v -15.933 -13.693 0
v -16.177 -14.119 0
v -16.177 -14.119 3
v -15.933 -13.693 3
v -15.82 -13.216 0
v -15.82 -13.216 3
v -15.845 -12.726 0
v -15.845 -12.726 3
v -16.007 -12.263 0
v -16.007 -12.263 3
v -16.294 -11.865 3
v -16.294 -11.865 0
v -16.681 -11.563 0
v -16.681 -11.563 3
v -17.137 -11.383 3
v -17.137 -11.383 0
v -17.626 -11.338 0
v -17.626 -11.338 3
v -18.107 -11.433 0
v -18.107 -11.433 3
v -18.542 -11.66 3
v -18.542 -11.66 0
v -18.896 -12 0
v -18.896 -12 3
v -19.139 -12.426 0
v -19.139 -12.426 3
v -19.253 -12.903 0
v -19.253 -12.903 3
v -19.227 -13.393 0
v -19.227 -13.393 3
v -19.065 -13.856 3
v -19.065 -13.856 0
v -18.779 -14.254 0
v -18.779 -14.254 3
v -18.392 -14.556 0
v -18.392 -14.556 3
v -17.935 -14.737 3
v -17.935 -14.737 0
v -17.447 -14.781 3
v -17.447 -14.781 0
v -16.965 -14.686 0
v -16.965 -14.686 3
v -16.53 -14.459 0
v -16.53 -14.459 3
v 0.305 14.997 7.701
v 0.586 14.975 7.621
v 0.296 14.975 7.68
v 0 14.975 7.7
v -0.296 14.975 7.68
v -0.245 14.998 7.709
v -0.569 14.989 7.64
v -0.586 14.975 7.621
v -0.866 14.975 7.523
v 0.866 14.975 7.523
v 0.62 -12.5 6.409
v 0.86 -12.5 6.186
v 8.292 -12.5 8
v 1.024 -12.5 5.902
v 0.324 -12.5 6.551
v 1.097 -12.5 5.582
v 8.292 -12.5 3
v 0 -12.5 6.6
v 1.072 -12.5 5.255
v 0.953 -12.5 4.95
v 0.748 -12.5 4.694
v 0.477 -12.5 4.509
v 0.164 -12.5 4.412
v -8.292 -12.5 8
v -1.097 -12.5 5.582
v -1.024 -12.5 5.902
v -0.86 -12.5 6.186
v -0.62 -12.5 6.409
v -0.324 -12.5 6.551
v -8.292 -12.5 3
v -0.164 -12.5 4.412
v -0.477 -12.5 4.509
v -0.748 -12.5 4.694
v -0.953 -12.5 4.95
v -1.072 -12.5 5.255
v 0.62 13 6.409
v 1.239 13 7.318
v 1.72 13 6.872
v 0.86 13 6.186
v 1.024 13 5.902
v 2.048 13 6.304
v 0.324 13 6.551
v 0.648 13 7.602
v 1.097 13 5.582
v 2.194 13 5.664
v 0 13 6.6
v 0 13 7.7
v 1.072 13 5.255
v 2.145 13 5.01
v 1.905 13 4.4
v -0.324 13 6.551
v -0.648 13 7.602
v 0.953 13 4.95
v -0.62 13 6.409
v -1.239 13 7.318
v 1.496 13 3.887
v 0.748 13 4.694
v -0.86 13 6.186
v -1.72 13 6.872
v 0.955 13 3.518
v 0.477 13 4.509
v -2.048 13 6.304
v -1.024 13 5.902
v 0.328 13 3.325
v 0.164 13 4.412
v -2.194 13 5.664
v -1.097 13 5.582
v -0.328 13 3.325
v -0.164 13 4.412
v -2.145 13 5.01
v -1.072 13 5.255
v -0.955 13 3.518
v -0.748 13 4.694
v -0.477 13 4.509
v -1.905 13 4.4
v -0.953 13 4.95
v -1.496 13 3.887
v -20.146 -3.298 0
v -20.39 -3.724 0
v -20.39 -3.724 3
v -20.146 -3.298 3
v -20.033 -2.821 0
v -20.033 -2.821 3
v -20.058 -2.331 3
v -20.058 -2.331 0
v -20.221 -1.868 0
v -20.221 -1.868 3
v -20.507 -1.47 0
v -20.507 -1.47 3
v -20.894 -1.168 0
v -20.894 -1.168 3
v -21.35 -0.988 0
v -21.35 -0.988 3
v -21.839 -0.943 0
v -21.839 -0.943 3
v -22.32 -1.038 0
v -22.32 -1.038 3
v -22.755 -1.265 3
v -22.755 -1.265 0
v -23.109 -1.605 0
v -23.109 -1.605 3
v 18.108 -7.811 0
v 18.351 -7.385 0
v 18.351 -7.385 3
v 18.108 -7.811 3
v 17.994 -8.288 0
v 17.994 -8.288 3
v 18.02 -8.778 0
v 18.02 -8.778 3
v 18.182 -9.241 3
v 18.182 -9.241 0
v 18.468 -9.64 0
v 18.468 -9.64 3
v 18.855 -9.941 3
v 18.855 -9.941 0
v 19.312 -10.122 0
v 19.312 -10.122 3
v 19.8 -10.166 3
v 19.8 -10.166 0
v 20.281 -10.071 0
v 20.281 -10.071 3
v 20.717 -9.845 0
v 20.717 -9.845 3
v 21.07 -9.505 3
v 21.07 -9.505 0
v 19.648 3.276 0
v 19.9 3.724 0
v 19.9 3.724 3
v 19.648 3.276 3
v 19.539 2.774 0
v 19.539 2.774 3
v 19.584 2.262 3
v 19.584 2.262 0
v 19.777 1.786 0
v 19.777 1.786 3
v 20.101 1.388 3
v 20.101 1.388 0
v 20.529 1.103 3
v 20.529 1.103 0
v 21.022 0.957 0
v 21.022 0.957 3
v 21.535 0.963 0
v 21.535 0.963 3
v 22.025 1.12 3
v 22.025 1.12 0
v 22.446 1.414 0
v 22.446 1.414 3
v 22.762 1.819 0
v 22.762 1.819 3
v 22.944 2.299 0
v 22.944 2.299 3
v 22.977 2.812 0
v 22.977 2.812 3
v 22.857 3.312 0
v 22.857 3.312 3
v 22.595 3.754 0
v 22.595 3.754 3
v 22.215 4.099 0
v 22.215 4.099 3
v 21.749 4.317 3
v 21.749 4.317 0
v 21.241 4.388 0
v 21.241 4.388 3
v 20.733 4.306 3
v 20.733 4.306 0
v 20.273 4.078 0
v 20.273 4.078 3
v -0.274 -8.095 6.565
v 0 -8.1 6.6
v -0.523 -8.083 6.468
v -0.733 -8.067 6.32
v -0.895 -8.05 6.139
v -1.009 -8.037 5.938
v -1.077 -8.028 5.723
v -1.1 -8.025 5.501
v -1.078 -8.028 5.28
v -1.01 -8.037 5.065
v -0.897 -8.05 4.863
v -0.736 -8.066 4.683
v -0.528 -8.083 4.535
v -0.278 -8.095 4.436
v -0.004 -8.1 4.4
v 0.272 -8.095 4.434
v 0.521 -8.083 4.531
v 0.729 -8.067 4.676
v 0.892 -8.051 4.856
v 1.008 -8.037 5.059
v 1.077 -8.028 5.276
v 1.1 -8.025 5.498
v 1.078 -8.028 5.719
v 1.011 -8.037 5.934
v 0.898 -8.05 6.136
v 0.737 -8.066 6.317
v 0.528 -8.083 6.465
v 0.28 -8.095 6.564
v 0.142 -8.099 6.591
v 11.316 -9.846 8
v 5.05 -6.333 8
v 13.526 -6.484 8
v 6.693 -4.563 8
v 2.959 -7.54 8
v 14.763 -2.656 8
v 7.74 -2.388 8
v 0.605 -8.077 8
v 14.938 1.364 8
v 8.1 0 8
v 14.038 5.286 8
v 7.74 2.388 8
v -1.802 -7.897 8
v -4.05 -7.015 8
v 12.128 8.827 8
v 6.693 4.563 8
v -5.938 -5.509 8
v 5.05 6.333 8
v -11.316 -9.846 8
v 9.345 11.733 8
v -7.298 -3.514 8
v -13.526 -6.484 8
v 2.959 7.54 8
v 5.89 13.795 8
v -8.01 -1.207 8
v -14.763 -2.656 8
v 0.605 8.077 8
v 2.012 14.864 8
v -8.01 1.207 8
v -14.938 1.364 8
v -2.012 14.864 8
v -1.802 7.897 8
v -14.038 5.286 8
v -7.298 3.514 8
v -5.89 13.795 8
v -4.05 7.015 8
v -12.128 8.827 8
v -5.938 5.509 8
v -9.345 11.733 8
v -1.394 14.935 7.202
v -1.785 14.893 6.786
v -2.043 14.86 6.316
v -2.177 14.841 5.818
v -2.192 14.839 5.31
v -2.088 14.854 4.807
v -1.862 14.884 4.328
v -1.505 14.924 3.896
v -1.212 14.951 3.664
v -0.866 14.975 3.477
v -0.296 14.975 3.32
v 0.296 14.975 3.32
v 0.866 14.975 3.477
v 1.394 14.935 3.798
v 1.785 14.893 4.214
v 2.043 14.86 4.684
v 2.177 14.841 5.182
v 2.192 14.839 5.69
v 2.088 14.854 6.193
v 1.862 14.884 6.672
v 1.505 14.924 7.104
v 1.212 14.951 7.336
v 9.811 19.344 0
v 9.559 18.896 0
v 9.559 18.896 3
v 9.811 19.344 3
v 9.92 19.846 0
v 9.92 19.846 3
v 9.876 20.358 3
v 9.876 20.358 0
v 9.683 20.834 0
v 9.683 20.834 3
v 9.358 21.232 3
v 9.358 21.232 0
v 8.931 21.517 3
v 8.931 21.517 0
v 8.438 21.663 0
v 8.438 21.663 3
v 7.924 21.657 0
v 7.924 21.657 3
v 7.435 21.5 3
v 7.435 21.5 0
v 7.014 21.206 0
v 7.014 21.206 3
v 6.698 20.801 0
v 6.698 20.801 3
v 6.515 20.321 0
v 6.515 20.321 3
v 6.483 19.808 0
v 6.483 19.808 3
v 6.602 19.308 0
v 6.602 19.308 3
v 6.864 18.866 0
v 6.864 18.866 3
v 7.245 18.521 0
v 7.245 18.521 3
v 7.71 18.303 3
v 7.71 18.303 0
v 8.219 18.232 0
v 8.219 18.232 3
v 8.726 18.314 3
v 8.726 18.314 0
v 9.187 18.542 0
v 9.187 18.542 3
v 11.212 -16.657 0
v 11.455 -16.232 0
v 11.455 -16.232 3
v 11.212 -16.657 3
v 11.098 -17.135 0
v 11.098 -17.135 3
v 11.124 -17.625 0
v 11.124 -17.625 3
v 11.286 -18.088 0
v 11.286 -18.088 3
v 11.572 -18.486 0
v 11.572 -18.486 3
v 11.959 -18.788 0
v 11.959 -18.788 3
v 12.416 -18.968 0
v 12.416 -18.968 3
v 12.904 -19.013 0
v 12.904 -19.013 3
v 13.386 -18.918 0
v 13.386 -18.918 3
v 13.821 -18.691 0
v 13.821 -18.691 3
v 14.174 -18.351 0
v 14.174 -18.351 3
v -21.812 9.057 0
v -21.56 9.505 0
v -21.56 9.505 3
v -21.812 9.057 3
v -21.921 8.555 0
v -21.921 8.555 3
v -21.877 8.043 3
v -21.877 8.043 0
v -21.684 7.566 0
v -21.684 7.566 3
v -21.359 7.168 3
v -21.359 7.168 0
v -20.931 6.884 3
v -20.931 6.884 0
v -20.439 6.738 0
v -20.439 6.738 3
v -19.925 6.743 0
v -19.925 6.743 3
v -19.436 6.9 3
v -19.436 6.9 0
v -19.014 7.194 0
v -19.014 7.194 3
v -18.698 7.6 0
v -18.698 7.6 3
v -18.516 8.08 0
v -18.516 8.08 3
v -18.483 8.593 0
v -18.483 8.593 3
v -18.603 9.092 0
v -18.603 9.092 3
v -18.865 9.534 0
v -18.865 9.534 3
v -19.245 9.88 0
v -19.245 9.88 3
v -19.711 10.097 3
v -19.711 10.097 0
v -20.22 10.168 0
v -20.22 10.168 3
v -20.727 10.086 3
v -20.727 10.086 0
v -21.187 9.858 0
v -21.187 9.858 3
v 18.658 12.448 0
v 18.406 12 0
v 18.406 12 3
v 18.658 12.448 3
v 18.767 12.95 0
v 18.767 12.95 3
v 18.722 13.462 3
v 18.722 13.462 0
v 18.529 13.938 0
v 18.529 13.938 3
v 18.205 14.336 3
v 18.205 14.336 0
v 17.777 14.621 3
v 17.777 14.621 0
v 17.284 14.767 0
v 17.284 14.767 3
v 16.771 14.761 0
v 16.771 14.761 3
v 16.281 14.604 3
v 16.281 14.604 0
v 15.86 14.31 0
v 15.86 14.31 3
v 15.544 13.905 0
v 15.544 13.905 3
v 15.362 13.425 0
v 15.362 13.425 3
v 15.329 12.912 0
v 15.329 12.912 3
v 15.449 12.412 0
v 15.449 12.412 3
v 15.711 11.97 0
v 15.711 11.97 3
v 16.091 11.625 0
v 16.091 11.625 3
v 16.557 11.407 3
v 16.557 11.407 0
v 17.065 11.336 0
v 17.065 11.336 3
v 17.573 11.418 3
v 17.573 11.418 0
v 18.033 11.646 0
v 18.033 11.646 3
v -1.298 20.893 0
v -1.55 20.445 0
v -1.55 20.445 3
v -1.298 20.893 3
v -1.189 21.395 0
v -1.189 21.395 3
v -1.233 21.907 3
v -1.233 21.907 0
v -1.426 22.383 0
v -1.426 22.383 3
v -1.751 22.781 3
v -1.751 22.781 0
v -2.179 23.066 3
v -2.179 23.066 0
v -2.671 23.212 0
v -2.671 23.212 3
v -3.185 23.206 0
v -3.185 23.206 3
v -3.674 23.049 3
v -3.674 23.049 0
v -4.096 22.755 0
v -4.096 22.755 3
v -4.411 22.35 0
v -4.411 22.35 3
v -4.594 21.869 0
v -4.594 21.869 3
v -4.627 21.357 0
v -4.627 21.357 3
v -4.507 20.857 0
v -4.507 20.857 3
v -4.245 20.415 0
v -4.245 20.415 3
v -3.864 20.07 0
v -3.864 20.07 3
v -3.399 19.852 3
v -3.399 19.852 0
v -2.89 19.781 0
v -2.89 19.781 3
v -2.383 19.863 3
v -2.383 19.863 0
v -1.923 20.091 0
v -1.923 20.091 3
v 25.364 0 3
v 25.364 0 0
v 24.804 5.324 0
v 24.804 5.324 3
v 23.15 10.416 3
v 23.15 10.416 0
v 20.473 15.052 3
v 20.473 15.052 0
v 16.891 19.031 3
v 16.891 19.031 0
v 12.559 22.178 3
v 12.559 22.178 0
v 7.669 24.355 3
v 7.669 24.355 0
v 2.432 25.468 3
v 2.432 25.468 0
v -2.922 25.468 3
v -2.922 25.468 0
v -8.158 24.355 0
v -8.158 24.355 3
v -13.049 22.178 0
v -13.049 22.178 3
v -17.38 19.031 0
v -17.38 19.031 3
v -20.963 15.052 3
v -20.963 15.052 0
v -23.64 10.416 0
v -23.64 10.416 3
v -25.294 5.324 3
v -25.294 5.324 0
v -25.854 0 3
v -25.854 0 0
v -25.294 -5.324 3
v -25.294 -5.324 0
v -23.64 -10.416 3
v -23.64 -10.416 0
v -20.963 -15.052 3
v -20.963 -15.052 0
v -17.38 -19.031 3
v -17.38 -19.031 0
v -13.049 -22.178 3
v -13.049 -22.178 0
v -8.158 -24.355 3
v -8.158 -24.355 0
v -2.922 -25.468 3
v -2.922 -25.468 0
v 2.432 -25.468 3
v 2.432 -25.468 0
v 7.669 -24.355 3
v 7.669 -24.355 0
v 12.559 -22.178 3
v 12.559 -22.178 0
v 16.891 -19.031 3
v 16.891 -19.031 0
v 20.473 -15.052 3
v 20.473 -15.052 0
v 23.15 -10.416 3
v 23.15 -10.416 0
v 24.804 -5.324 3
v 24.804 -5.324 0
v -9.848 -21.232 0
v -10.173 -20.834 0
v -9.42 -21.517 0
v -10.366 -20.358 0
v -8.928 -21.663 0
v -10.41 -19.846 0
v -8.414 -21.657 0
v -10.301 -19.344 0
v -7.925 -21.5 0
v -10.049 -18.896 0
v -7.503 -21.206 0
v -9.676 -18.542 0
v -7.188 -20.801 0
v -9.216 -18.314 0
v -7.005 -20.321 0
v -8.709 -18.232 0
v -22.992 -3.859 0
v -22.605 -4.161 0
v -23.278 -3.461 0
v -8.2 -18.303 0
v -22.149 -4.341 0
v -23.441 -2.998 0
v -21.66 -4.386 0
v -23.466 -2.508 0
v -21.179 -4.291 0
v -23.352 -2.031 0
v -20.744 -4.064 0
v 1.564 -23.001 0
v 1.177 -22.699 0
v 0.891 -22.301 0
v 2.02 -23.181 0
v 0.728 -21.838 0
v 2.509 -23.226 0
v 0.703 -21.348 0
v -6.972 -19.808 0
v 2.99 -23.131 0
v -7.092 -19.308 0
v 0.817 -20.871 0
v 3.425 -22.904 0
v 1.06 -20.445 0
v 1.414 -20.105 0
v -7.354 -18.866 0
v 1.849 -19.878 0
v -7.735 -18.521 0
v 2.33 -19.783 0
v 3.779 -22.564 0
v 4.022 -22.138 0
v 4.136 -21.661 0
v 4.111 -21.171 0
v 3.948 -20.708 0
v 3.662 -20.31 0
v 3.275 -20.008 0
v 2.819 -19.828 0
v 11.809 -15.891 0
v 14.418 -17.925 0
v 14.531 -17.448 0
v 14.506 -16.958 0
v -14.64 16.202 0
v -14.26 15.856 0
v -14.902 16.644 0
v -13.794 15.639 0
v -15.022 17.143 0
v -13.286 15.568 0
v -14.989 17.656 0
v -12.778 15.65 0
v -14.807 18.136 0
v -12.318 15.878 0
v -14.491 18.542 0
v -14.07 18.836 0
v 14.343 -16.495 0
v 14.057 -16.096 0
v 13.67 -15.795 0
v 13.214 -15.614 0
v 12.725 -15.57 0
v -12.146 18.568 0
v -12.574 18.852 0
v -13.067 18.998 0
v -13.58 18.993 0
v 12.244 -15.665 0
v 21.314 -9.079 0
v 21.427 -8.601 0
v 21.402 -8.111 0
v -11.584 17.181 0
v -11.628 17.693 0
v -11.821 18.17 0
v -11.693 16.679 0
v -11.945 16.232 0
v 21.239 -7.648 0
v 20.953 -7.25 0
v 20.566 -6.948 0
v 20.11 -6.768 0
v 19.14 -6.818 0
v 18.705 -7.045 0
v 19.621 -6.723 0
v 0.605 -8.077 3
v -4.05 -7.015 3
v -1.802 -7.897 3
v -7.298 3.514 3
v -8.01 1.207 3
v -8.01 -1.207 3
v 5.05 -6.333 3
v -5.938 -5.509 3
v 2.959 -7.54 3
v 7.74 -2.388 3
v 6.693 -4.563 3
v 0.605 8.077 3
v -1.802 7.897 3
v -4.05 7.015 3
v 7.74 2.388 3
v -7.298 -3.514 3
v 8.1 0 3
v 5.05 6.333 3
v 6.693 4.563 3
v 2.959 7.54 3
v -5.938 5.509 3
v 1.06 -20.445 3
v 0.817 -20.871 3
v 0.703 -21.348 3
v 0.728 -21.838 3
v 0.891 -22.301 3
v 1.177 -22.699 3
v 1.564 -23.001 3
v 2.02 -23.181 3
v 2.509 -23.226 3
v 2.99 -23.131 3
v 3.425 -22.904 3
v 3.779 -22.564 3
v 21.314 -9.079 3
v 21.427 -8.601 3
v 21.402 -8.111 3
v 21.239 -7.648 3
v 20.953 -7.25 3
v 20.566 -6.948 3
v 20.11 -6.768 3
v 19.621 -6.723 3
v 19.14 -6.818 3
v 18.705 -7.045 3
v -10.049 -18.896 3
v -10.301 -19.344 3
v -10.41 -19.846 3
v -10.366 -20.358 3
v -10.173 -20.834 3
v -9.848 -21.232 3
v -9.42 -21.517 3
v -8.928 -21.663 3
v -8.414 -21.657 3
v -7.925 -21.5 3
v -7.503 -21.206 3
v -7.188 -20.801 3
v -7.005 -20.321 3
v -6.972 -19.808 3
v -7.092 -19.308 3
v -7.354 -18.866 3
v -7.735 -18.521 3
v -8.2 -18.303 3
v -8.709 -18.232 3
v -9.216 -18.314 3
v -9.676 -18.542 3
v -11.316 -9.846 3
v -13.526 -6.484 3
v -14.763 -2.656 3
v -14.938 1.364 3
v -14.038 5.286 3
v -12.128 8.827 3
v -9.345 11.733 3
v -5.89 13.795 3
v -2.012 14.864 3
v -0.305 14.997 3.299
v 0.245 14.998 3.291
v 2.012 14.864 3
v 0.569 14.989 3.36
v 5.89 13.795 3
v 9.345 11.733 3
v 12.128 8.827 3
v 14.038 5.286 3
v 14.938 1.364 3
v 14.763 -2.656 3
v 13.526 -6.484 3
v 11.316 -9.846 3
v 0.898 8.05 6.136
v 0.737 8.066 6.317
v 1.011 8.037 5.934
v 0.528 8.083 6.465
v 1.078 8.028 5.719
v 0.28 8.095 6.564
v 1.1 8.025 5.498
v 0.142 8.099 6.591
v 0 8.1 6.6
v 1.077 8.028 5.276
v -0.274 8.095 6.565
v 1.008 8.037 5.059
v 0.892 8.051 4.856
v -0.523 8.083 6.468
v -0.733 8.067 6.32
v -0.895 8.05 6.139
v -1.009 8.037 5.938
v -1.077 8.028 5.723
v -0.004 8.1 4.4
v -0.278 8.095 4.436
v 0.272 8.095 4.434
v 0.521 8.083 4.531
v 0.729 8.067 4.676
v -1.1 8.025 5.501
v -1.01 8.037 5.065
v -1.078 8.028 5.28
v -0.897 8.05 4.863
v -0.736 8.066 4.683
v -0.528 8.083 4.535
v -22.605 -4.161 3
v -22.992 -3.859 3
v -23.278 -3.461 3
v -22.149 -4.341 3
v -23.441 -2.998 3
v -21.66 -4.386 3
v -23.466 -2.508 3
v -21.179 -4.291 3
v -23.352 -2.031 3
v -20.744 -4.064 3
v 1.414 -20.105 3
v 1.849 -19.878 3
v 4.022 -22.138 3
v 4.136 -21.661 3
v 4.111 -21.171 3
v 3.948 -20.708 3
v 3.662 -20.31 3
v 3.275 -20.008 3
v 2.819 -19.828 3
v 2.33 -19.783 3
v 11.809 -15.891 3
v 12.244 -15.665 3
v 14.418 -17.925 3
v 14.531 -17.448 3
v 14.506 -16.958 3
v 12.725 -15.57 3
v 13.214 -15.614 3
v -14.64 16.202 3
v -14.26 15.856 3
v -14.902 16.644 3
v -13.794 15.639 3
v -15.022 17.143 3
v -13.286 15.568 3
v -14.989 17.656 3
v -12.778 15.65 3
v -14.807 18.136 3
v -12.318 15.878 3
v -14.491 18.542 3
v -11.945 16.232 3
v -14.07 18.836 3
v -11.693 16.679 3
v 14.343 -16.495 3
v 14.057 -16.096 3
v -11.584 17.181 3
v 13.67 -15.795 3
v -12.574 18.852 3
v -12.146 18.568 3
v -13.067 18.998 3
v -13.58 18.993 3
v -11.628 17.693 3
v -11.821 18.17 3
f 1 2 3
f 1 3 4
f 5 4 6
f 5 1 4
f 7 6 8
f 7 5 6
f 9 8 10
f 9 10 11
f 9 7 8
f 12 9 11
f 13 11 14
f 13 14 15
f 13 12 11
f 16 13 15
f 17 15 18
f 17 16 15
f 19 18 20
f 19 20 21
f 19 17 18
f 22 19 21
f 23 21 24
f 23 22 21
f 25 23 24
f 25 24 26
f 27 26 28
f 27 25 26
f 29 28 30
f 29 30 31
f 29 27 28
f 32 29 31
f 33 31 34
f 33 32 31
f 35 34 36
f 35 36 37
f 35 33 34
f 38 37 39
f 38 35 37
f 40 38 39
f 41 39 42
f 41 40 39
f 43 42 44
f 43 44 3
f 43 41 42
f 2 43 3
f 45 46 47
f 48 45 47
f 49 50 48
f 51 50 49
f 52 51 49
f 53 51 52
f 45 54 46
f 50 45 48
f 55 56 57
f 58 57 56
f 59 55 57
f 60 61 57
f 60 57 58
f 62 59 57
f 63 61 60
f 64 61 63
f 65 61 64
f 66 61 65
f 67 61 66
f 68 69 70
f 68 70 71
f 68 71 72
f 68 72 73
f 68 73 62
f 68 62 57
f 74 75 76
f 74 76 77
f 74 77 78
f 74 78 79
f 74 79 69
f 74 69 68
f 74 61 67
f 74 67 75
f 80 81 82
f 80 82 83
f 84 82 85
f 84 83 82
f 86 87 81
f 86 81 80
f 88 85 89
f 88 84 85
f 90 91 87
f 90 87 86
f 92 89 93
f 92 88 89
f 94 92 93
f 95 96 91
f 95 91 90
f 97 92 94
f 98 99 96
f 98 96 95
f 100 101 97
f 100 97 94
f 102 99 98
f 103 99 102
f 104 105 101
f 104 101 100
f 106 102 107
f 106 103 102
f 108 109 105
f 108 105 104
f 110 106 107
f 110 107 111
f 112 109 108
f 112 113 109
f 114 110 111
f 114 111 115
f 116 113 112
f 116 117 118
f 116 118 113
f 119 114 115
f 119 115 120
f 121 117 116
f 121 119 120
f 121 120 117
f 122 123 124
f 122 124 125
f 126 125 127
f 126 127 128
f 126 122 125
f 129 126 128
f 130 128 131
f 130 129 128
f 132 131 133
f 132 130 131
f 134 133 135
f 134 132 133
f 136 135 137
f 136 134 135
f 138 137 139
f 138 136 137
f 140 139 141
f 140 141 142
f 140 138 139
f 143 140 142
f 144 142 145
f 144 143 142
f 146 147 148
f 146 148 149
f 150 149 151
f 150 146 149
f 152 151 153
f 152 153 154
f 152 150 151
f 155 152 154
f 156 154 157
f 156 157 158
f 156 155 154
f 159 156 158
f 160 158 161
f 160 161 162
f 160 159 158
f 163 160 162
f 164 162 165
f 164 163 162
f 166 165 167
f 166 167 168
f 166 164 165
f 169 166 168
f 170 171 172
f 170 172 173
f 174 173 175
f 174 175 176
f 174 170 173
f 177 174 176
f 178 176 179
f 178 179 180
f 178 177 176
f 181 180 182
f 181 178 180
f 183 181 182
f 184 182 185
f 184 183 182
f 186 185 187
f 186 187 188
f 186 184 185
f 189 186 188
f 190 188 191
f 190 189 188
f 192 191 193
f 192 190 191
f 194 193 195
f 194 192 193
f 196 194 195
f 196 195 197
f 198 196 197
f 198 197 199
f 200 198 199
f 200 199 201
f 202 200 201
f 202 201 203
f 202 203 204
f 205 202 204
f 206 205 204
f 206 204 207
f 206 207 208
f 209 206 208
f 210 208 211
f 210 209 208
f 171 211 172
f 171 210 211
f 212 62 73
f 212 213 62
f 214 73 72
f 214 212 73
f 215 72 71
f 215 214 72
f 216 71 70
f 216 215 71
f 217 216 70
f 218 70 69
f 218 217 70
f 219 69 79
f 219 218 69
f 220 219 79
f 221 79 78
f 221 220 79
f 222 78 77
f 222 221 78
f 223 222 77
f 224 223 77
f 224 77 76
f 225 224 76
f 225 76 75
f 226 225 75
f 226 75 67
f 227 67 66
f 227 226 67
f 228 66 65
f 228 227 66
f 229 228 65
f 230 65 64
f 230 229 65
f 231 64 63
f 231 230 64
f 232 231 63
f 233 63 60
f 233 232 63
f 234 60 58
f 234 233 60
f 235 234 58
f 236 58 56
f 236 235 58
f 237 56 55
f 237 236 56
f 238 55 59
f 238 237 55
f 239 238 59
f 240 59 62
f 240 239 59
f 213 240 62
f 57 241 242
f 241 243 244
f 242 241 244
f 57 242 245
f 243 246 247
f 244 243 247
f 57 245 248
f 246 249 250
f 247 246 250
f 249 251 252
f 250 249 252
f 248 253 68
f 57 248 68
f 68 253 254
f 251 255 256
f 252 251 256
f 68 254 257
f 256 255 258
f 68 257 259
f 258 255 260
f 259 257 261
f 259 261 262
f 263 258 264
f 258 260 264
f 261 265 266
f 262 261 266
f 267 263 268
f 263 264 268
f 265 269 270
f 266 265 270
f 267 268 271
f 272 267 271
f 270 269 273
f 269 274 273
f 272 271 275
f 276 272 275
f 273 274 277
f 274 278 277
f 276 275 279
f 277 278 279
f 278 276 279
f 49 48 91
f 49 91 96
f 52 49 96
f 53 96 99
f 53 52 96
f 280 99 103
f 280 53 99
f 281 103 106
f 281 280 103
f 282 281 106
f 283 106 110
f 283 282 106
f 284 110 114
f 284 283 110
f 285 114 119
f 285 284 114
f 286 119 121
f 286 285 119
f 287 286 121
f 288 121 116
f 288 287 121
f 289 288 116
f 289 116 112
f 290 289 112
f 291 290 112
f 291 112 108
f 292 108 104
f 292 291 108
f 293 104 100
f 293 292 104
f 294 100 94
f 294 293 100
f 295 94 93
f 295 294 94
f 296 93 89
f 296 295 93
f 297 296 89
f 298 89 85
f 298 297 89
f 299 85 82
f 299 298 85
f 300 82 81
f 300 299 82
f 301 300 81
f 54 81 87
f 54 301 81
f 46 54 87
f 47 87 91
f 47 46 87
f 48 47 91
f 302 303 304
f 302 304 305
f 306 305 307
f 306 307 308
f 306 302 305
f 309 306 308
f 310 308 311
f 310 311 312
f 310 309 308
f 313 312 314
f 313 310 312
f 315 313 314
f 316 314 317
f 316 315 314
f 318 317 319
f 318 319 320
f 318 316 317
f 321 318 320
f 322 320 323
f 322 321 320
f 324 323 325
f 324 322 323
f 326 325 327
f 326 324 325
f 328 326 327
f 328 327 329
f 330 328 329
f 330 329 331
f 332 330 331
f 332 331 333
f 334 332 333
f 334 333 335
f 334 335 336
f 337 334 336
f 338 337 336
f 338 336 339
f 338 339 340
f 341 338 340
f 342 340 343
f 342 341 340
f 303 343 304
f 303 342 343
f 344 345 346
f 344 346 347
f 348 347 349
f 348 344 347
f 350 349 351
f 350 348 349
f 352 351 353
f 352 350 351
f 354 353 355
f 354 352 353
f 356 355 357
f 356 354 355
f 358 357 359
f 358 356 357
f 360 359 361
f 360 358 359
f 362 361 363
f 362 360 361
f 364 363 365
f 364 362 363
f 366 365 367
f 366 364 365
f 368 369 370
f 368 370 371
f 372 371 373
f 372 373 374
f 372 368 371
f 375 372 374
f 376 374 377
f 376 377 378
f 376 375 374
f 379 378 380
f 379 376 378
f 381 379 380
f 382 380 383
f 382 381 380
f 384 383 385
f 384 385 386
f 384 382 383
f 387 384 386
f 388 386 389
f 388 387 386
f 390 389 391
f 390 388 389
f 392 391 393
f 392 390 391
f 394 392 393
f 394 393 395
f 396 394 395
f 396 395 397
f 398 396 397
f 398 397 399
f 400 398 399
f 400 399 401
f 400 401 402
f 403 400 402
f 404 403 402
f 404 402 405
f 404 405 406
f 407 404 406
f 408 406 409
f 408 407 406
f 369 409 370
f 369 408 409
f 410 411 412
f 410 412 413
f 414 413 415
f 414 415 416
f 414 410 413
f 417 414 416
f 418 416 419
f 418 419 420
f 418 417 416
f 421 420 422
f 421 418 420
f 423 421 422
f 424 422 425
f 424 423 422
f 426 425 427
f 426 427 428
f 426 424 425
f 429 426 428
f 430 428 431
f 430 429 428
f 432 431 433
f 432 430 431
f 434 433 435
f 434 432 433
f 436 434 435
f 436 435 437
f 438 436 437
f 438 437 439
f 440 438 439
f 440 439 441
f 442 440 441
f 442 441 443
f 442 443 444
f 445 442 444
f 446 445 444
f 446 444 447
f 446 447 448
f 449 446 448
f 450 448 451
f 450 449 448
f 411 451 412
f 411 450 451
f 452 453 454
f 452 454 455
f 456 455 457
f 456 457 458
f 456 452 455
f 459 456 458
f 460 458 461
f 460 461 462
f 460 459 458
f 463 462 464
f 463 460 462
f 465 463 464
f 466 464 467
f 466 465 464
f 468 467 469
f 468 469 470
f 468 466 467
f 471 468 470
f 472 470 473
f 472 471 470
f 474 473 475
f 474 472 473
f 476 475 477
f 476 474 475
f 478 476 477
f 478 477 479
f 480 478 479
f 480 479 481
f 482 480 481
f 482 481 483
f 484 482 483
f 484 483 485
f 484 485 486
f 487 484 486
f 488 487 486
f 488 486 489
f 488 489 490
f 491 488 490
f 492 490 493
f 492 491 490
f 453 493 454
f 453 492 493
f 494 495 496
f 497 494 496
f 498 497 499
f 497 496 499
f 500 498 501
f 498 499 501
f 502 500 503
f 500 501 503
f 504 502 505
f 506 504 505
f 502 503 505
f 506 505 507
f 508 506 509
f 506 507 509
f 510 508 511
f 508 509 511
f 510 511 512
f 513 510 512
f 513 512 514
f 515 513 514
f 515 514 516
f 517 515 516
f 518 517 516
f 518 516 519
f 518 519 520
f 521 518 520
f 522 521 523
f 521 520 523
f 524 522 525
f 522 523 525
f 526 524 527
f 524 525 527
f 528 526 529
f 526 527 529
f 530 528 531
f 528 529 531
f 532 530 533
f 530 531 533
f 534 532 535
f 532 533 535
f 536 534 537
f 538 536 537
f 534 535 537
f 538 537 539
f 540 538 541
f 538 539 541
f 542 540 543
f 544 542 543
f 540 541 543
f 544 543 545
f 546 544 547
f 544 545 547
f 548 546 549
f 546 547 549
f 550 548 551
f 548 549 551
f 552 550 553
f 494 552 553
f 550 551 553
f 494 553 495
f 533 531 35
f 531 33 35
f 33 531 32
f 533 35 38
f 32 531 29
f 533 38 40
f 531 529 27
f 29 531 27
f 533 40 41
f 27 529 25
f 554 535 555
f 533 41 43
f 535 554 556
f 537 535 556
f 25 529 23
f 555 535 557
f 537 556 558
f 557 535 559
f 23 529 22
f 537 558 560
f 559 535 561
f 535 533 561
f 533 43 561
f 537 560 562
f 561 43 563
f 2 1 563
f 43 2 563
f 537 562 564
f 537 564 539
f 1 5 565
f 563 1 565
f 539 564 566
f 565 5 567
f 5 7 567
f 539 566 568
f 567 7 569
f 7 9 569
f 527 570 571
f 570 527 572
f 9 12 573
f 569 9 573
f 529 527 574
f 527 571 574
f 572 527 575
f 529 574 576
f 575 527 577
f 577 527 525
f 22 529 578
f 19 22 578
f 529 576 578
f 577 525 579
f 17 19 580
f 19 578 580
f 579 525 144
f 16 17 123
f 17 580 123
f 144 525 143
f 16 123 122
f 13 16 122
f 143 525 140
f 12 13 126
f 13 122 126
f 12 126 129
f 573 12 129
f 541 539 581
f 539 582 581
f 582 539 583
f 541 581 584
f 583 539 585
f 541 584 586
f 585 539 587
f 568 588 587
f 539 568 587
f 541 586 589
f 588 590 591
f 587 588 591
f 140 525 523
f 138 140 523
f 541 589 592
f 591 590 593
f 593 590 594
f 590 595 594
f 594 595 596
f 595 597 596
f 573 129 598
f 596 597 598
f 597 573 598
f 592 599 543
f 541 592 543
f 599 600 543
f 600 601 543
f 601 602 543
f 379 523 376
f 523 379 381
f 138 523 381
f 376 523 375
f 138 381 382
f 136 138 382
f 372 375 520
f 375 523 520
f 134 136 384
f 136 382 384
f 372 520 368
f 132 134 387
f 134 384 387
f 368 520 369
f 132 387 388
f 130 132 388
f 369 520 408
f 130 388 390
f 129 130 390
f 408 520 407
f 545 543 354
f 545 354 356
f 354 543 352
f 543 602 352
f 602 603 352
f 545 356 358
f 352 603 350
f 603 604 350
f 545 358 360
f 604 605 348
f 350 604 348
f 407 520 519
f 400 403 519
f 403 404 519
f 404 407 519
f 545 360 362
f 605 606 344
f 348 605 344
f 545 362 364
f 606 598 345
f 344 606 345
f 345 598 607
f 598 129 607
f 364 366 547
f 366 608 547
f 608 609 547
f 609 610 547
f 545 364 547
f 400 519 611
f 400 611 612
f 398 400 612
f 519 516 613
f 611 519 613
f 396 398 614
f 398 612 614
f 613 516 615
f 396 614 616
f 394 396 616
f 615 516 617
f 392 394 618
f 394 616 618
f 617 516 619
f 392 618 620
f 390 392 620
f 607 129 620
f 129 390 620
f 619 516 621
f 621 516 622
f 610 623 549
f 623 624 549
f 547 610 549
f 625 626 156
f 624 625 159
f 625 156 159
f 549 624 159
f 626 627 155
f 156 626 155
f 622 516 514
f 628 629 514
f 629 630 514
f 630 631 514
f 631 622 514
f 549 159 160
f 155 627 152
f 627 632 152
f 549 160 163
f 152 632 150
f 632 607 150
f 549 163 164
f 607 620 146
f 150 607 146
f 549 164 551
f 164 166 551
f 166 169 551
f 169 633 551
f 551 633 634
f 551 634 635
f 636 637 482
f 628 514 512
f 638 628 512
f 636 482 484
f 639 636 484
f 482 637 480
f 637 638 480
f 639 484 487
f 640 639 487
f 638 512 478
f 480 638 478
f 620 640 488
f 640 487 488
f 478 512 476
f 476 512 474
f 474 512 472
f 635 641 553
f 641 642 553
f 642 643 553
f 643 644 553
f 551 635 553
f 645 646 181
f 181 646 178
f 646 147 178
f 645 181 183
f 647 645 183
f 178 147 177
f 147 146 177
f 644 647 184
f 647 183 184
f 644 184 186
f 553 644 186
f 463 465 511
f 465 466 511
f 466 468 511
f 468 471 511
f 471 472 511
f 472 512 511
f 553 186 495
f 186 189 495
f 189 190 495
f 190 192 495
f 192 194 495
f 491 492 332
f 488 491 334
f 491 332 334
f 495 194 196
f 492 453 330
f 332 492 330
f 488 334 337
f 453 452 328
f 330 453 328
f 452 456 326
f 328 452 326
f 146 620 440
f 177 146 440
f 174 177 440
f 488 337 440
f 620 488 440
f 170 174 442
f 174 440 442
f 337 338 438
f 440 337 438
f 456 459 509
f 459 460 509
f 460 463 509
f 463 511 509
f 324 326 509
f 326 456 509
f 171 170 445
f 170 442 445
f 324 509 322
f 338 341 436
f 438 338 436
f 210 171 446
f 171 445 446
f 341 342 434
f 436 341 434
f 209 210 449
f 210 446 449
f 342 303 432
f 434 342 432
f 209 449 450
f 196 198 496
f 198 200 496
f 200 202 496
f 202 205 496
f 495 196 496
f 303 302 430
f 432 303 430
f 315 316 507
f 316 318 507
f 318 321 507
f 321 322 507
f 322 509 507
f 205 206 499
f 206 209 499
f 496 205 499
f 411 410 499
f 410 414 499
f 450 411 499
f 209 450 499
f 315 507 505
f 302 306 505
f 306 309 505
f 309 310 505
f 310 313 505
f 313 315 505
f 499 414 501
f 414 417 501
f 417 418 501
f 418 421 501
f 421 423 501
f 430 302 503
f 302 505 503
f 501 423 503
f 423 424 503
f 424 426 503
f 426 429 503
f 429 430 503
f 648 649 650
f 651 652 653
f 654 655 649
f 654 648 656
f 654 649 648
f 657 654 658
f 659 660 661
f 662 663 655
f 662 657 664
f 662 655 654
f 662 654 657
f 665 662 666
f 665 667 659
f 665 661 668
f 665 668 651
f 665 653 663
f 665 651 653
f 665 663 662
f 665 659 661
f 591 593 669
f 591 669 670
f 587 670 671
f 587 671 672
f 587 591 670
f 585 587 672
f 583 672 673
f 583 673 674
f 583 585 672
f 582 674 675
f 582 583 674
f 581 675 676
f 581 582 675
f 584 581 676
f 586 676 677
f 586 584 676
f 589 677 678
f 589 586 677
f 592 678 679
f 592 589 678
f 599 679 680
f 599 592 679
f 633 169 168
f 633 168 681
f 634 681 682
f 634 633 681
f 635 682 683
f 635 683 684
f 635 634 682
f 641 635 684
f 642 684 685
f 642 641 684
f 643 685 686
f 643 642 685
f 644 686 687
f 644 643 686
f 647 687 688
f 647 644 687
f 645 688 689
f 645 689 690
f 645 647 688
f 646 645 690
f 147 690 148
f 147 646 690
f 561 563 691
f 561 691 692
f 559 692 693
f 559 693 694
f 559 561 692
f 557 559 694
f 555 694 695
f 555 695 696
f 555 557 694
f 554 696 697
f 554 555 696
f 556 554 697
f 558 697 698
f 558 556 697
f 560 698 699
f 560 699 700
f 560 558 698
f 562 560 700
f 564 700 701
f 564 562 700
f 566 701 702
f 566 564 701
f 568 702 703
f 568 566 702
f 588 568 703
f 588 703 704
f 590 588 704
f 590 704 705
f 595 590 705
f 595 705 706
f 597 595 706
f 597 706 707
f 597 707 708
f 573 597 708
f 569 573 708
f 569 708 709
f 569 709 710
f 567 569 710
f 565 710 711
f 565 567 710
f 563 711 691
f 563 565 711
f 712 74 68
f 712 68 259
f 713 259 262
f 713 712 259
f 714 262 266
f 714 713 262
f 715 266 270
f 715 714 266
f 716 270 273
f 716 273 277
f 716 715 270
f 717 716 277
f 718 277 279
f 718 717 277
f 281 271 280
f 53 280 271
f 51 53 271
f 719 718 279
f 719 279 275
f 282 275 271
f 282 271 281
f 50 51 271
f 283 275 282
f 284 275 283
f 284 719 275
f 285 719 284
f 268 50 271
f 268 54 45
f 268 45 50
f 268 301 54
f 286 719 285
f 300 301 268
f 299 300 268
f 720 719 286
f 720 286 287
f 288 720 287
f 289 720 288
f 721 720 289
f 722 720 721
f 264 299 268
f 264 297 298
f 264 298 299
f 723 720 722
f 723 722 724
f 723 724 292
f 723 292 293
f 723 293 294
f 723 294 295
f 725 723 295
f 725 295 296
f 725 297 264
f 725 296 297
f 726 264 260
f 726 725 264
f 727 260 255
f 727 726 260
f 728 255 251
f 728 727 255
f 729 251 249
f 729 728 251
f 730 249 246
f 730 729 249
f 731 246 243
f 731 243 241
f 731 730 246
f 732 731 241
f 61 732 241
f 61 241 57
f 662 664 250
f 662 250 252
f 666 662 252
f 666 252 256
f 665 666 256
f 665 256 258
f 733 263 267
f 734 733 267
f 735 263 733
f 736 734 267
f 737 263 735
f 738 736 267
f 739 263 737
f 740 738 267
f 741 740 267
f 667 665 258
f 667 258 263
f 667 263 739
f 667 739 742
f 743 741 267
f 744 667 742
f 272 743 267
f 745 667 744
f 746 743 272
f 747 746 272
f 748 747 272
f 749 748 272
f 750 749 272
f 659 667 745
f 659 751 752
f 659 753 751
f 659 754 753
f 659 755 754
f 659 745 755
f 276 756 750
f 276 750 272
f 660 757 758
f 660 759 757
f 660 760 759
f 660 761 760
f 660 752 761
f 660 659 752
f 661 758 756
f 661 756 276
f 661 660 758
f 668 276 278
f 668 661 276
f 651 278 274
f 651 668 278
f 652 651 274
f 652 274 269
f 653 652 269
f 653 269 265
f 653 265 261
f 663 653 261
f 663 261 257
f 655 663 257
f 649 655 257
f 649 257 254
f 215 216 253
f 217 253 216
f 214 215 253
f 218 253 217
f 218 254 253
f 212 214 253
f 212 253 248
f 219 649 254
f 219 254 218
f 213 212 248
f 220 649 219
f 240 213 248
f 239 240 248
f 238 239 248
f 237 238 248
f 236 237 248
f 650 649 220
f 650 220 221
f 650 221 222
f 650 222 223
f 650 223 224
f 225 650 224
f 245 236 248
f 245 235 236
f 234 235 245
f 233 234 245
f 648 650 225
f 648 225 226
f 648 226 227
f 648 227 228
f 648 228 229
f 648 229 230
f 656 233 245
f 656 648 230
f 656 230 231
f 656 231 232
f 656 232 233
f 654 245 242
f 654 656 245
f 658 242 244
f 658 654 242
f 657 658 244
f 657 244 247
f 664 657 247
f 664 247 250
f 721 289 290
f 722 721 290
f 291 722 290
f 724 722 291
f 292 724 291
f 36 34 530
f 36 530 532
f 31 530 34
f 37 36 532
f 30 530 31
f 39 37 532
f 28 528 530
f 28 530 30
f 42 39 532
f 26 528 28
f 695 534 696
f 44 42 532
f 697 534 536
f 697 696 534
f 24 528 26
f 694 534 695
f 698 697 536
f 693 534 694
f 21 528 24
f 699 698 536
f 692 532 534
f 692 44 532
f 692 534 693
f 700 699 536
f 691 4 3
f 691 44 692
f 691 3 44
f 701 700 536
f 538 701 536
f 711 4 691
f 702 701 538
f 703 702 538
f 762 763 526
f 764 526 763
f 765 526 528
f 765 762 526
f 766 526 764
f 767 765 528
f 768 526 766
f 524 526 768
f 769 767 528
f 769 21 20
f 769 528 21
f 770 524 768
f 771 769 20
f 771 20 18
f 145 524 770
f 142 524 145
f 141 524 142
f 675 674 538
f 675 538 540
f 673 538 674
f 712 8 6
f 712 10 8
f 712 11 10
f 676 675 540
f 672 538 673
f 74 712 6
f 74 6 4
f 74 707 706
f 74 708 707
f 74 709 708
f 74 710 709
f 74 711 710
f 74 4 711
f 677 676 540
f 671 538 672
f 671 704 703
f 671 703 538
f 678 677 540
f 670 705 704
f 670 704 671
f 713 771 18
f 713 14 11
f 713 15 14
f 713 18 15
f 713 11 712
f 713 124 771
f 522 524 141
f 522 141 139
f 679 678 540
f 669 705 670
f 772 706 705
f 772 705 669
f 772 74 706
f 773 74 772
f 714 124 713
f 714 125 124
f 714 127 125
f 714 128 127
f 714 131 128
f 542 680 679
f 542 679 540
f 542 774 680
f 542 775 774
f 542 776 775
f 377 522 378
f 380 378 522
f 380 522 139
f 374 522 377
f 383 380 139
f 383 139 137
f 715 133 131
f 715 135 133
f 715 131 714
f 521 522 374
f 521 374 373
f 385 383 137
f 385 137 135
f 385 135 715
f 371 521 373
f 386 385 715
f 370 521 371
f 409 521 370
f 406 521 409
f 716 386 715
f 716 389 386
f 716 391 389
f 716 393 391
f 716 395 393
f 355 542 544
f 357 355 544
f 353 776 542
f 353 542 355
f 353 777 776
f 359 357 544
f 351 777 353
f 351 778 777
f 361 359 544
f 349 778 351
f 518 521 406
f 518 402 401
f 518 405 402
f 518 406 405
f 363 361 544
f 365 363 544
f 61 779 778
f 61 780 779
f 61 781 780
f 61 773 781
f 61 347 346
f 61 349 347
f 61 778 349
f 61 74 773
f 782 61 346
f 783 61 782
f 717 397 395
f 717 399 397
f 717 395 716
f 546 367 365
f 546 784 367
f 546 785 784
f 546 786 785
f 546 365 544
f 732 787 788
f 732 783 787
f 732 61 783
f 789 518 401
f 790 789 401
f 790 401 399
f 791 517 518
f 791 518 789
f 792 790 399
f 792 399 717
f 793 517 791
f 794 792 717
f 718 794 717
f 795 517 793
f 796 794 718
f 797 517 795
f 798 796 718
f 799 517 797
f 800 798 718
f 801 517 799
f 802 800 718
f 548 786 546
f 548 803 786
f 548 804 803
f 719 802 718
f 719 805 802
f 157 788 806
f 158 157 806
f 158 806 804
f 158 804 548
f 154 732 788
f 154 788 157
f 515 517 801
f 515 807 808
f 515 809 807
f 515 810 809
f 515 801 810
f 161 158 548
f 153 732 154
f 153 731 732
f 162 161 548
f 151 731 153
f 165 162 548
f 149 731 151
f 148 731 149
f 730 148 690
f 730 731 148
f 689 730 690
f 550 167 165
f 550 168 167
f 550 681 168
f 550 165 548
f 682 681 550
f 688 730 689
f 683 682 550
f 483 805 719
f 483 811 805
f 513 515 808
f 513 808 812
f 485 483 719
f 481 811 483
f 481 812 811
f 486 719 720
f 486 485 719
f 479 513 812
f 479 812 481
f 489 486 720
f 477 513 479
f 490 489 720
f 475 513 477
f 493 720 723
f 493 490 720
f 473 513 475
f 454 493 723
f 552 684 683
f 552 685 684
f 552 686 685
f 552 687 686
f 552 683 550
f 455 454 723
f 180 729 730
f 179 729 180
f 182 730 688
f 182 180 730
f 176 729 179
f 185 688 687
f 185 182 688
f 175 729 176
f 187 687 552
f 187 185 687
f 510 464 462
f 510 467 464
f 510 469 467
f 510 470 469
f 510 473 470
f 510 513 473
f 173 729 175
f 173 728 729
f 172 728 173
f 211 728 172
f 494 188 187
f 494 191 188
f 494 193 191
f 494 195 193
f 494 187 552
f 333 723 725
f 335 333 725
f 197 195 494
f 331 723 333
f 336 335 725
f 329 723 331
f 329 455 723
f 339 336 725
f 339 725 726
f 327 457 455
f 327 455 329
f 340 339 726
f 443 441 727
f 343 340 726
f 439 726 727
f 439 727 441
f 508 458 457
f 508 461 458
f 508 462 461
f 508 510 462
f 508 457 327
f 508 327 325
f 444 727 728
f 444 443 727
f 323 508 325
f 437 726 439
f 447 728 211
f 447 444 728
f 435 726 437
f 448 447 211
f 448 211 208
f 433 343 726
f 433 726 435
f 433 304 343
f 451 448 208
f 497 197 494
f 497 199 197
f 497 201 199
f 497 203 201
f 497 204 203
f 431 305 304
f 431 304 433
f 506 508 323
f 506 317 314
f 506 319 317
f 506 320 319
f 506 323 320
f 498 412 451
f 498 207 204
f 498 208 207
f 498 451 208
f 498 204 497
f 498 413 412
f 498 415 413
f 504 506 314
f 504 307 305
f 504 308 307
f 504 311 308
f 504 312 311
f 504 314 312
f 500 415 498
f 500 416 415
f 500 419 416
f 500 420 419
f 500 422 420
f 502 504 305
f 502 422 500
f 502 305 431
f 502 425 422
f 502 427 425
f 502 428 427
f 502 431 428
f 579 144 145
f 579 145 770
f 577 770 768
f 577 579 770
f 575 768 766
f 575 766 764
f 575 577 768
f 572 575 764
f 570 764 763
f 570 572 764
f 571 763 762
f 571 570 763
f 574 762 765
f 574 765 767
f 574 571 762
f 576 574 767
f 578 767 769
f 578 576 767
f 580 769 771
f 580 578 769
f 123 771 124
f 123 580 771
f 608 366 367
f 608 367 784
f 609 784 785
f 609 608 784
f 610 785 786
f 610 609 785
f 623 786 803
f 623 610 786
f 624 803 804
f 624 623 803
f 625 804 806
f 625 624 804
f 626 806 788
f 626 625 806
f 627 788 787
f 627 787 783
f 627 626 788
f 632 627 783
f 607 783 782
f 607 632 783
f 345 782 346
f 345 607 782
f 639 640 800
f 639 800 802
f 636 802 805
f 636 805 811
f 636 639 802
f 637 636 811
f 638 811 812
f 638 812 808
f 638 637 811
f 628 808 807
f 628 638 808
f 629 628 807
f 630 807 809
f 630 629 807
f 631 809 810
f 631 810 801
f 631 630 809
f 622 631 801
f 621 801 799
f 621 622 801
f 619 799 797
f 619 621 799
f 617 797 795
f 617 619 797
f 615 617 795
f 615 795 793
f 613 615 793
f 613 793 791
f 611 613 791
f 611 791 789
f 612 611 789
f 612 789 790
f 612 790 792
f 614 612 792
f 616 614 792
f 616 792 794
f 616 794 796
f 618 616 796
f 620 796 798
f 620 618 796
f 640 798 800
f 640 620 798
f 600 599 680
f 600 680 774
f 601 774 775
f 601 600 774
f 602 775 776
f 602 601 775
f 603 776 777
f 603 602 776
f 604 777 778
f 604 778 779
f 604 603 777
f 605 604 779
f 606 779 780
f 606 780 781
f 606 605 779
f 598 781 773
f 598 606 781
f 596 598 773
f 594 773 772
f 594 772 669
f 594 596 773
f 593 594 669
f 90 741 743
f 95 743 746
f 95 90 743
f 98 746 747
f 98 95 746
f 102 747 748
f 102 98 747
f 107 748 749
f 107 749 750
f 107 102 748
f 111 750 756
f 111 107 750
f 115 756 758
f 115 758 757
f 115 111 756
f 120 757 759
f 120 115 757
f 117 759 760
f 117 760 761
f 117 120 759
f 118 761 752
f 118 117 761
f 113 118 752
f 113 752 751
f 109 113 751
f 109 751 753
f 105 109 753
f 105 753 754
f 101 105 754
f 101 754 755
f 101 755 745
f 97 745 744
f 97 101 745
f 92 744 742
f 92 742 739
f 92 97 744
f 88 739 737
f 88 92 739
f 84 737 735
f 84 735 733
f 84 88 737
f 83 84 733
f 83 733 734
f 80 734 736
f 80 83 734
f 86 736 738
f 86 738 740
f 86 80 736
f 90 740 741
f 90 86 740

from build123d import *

# Parameters (mm, degrees)
SKETCH1_R           = 25.608746635
BOSS_EXTRUDE1_DEPTH = 3
SKETCH2_R           = 8.1
BOSS_EXTRUDE2_DEPTH = 5


with BuildPart() as part:
    # Sketch1 → Boss-Extrude1 (new body)
    with BuildSketch(Plane.XY):
        with Locations((-0.244898521, 0)):
            Circle(SKETCH1_R)
        with BuildLine():
            ThreePointArc((-18.841121629, 7.385104949), (-19.140852563, 9.804238645), (-21.559986259, 9.504507711))
            ThreePointArc((-21.559986259, 9.504507711), (-21.260255325, 7.085374015), (-18.841121629, 7.385104949))
        make_face(mode=Mode.SUBTRACT)
        with BuildLine():
            ThreePointArc((-20.389973917, -3.72411228), (-20.689704851, -1.304978585), (-23.108838546, -1.604709519))
            ThreePointArc((-23.108838546, -1.604709519), (-22.809107612, -4.023843215), (-20.389973917, -3.72411228))
        make_face(mode=Mode.SUBTRACT)
        with BuildLine():
            ThreePointArc((-16.176710729, -14.119402761), (-16.476441664, -11.700269066), (-18.895575359, -12))
            ThreePointArc((-18.895575359, -12), (-18.595844425, -14.419133695), (-16.176710729, -14.119402761))
        make_face(mode=Mode.SUBTRACT)
        with BuildLine():
            ThreePointArc((-7.330272536, -21.015356804), (-7.63000347, -18.596223108), (-10.049137166, -18.895954043))
            ThreePointArc((-10.049137166, -18.895954043), (-9.749406231, -21.315087738), (-7.330272536, -21.015356804))
        make_face(mode=Mode.SUBTRACT)
        with BuildLine():
            ThreePointArc((3.778944694, -22.564209091), (3.479213759, -20.145075396), (1.060080064, -20.44480633))
            ThreePointArc((1.060080064, -20.44480633), (1.359810998, -22.863940025), (3.778944694, -22.564209091))
        make_face(mode=Mode.SUBTRACT)
        with BuildLine():
            ThreePointArc((11.455370545, -16.231543143), (11.755101479, -18.650676838), (14.174235175, -18.350945904))
            ThreePointArc((14.174235175, -18.350945904), (13.87450424, -15.931812209), (11.455370545, -16.231543143))
        make_face(mode=Mode.SUBTRACT)
        with BuildLine():
            ThreePointArc((18.351324588, -7.385104949), (18.651055522, -9.804238645), (21.070189217, -9.504507711))
            ThreePointArc((21.070189217, -9.504507711), (20.770458283, -7.085374015), (18.351324588, -7.385104949))
        make_face(mode=Mode.SUBTRACT)
        with BuildLine():
            ThreePointArc((22.619041505, 1.604709519), (22.31931057, 4.023843215), (19.900176875, 3.72411228))
            ThreePointArc((19.900176875, 3.72411228), (20.199907809, 1.304978585), (22.619041505, 1.604709519))
        make_face(mode=Mode.SUBTRACT)
        with BuildLine():
            ThreePointArc((15.686913688, 14.119402761), (15.986644622, 11.700269066), (18.405778317, 12))
            ThreePointArc((18.405778317, 12), (18.106047383, 14.419133695), (15.686913688, 14.119402761))
        make_face(mode=Mode.SUBTRACT)
        with BuildLine():
            ThreePointArc((6.840475494, 21.015356804), (7.140206429, 18.596223108), (9.559340124, 18.895954043))
            ThreePointArc((9.559340124, 18.895954043), (9.25960919, 21.315087738), (6.840475494, 21.015356804))
        make_face(mode=Mode.SUBTRACT)
        with BuildLine():
            ThreePointArc((-4.268741735, 22.564209091), (-3.969010801, 20.145075396), (-1.549877106, 20.44480633))
            ThreePointArc((-1.549877106, 20.44480633), (-1.84960804, 22.863940025), (-4.268741735, 22.564209091))
        make_face(mode=Mode.SUBTRACT)
        with BuildLine():
            ThreePointArc((-14.664032216, 18.350945904), (-14.364301282, 15.931812209), (-11.945167587, 16.231543143))
            ThreePointArc((-11.945167587, 16.231543143), (-12.244898521, 18.650676838), (-14.664032216, 18.350945904))
        make_face(mode=Mode.SUBTRACT)
    extrude(amount=BOSS_EXTRUDE1_DEPTH)

    # Sketch2 → Boss-Extrude2 (add)
    with BuildSketch(Plane.XY.offset(3)):
        with BuildLine():
            Line((8.291561976, -12.5), (-8.291561976, -12.5))
            ThreePointArc((-8.291561976, -12.5), (0, 15), (8.291561976, -12.5))
        make_face()
        Circle(SKETCH2_R, mode=Mode.SUBTRACT)
    extrude(amount=BOSS_EXTRUDE2_DEPTH)

    # Sketch4 → CBORE for M2 SHCS1 (revolve, cut)
    with BuildSketch(Plane(origin=(0, 15, 5.5), x_dir=(0, 0, 1), z_dir=(1, 0, 0))):
        Polygon((0, 0), (0, 40.608746635), (1.1, 40.608746635), (1.1, 2), (2.2, 2), (2.2, 0.025), (2.225, 0), align=None)
    revolve(axis=Axis((0, 21.35, 5.5), (0, -1, 0)), mode=Mode.SUBTRACT)


solid = part.part
